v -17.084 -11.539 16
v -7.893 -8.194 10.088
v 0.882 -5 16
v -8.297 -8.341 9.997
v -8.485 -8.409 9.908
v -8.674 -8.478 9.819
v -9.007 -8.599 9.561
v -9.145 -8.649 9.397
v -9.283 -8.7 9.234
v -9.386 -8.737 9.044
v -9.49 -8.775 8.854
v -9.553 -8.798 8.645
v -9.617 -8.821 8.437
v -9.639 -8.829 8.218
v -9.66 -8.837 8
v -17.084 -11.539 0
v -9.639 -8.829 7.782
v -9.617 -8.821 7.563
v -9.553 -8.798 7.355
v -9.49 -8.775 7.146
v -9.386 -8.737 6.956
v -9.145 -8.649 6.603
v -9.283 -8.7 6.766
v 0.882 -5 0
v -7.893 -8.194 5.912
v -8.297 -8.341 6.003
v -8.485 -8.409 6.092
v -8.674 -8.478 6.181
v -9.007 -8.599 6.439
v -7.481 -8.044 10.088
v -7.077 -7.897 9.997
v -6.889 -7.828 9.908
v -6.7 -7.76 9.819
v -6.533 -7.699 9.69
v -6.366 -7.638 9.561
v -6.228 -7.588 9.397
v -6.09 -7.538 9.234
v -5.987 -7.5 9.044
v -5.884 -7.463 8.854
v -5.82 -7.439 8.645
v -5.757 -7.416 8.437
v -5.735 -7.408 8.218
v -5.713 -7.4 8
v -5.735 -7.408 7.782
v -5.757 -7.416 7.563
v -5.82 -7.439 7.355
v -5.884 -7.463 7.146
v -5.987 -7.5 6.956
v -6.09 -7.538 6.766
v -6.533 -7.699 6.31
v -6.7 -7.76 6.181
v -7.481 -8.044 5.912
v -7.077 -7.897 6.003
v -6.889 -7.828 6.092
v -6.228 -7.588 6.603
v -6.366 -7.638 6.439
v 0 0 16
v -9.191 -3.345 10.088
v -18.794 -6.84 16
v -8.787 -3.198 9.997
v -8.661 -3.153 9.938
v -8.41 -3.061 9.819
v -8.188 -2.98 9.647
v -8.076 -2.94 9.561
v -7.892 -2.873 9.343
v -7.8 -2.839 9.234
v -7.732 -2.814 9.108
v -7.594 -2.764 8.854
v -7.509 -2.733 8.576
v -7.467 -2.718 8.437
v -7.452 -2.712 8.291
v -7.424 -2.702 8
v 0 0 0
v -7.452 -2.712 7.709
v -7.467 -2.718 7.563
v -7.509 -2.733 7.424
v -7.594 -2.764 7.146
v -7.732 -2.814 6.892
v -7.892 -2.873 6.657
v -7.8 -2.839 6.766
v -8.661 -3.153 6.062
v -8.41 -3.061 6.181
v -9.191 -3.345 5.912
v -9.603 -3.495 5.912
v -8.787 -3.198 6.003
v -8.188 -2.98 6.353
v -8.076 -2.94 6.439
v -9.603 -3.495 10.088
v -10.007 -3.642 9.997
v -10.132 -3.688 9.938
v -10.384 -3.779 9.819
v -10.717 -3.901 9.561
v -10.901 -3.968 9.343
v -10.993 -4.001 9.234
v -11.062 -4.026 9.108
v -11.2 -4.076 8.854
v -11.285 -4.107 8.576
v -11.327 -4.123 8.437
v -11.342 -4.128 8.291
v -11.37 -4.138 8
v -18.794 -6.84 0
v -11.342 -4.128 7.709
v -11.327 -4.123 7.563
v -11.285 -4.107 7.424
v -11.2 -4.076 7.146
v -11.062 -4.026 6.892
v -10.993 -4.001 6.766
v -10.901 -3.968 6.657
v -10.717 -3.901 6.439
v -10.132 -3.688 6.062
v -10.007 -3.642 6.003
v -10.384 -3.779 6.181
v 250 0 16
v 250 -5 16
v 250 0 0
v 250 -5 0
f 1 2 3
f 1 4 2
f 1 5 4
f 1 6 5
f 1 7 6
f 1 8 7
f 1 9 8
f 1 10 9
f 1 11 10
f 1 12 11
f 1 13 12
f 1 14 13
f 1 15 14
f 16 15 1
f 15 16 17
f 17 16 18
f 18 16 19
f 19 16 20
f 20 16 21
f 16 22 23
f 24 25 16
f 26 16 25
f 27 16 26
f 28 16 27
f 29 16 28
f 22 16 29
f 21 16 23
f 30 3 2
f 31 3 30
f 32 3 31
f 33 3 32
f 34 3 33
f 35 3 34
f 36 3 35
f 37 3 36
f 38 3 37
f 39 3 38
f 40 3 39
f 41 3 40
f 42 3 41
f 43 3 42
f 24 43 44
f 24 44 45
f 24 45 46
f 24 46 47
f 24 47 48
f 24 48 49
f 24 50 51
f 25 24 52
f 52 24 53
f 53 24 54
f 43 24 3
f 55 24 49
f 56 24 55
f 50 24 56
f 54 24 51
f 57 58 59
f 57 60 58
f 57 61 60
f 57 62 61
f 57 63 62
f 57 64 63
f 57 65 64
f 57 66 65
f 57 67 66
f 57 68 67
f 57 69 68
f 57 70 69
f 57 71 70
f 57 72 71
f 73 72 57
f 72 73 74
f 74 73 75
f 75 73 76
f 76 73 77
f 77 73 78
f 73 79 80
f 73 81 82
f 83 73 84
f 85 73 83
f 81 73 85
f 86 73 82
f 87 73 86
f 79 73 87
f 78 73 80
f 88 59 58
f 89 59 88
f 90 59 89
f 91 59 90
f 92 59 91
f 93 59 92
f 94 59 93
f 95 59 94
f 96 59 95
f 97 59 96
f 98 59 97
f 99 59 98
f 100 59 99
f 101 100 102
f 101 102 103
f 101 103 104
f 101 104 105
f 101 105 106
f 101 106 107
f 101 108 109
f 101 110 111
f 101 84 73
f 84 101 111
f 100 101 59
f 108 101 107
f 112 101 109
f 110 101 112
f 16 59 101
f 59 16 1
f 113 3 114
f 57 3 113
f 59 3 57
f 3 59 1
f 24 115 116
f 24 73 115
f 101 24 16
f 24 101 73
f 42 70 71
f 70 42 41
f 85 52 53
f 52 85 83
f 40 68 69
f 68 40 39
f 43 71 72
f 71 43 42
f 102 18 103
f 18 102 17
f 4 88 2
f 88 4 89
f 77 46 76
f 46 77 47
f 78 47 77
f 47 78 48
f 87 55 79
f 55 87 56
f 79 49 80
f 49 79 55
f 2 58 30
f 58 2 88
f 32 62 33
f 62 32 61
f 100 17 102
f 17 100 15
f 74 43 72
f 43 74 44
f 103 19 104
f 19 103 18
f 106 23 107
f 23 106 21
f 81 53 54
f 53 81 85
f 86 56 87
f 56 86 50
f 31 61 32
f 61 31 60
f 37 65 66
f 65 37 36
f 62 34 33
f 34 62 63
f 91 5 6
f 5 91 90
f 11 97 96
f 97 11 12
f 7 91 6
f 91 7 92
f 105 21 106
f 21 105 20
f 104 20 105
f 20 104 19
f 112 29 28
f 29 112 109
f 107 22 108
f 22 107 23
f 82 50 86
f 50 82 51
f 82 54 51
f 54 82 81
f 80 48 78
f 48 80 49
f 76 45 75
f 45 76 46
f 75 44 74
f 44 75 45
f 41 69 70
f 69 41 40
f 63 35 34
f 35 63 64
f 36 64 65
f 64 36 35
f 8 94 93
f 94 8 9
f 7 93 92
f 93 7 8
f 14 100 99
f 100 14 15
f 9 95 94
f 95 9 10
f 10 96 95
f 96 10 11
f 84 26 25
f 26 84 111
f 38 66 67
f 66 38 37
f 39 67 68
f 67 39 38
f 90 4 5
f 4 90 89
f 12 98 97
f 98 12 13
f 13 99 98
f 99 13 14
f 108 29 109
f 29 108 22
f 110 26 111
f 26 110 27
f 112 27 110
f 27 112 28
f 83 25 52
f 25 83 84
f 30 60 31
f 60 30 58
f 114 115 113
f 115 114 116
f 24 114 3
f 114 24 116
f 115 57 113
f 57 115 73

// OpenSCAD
rotate([90, 0, 0])
union() {
    cube([250, 16, 5]);

    difference() {
        color("red")
            rotate([0, 20, 0])
            translate([-20, 0, 0])
            cube([20, 16, 5]);

        rotate([0, 20, 0])
            translate([-10, 8, -10])
            cylinder(30, d=4.2, $fn=30);
    }
}
